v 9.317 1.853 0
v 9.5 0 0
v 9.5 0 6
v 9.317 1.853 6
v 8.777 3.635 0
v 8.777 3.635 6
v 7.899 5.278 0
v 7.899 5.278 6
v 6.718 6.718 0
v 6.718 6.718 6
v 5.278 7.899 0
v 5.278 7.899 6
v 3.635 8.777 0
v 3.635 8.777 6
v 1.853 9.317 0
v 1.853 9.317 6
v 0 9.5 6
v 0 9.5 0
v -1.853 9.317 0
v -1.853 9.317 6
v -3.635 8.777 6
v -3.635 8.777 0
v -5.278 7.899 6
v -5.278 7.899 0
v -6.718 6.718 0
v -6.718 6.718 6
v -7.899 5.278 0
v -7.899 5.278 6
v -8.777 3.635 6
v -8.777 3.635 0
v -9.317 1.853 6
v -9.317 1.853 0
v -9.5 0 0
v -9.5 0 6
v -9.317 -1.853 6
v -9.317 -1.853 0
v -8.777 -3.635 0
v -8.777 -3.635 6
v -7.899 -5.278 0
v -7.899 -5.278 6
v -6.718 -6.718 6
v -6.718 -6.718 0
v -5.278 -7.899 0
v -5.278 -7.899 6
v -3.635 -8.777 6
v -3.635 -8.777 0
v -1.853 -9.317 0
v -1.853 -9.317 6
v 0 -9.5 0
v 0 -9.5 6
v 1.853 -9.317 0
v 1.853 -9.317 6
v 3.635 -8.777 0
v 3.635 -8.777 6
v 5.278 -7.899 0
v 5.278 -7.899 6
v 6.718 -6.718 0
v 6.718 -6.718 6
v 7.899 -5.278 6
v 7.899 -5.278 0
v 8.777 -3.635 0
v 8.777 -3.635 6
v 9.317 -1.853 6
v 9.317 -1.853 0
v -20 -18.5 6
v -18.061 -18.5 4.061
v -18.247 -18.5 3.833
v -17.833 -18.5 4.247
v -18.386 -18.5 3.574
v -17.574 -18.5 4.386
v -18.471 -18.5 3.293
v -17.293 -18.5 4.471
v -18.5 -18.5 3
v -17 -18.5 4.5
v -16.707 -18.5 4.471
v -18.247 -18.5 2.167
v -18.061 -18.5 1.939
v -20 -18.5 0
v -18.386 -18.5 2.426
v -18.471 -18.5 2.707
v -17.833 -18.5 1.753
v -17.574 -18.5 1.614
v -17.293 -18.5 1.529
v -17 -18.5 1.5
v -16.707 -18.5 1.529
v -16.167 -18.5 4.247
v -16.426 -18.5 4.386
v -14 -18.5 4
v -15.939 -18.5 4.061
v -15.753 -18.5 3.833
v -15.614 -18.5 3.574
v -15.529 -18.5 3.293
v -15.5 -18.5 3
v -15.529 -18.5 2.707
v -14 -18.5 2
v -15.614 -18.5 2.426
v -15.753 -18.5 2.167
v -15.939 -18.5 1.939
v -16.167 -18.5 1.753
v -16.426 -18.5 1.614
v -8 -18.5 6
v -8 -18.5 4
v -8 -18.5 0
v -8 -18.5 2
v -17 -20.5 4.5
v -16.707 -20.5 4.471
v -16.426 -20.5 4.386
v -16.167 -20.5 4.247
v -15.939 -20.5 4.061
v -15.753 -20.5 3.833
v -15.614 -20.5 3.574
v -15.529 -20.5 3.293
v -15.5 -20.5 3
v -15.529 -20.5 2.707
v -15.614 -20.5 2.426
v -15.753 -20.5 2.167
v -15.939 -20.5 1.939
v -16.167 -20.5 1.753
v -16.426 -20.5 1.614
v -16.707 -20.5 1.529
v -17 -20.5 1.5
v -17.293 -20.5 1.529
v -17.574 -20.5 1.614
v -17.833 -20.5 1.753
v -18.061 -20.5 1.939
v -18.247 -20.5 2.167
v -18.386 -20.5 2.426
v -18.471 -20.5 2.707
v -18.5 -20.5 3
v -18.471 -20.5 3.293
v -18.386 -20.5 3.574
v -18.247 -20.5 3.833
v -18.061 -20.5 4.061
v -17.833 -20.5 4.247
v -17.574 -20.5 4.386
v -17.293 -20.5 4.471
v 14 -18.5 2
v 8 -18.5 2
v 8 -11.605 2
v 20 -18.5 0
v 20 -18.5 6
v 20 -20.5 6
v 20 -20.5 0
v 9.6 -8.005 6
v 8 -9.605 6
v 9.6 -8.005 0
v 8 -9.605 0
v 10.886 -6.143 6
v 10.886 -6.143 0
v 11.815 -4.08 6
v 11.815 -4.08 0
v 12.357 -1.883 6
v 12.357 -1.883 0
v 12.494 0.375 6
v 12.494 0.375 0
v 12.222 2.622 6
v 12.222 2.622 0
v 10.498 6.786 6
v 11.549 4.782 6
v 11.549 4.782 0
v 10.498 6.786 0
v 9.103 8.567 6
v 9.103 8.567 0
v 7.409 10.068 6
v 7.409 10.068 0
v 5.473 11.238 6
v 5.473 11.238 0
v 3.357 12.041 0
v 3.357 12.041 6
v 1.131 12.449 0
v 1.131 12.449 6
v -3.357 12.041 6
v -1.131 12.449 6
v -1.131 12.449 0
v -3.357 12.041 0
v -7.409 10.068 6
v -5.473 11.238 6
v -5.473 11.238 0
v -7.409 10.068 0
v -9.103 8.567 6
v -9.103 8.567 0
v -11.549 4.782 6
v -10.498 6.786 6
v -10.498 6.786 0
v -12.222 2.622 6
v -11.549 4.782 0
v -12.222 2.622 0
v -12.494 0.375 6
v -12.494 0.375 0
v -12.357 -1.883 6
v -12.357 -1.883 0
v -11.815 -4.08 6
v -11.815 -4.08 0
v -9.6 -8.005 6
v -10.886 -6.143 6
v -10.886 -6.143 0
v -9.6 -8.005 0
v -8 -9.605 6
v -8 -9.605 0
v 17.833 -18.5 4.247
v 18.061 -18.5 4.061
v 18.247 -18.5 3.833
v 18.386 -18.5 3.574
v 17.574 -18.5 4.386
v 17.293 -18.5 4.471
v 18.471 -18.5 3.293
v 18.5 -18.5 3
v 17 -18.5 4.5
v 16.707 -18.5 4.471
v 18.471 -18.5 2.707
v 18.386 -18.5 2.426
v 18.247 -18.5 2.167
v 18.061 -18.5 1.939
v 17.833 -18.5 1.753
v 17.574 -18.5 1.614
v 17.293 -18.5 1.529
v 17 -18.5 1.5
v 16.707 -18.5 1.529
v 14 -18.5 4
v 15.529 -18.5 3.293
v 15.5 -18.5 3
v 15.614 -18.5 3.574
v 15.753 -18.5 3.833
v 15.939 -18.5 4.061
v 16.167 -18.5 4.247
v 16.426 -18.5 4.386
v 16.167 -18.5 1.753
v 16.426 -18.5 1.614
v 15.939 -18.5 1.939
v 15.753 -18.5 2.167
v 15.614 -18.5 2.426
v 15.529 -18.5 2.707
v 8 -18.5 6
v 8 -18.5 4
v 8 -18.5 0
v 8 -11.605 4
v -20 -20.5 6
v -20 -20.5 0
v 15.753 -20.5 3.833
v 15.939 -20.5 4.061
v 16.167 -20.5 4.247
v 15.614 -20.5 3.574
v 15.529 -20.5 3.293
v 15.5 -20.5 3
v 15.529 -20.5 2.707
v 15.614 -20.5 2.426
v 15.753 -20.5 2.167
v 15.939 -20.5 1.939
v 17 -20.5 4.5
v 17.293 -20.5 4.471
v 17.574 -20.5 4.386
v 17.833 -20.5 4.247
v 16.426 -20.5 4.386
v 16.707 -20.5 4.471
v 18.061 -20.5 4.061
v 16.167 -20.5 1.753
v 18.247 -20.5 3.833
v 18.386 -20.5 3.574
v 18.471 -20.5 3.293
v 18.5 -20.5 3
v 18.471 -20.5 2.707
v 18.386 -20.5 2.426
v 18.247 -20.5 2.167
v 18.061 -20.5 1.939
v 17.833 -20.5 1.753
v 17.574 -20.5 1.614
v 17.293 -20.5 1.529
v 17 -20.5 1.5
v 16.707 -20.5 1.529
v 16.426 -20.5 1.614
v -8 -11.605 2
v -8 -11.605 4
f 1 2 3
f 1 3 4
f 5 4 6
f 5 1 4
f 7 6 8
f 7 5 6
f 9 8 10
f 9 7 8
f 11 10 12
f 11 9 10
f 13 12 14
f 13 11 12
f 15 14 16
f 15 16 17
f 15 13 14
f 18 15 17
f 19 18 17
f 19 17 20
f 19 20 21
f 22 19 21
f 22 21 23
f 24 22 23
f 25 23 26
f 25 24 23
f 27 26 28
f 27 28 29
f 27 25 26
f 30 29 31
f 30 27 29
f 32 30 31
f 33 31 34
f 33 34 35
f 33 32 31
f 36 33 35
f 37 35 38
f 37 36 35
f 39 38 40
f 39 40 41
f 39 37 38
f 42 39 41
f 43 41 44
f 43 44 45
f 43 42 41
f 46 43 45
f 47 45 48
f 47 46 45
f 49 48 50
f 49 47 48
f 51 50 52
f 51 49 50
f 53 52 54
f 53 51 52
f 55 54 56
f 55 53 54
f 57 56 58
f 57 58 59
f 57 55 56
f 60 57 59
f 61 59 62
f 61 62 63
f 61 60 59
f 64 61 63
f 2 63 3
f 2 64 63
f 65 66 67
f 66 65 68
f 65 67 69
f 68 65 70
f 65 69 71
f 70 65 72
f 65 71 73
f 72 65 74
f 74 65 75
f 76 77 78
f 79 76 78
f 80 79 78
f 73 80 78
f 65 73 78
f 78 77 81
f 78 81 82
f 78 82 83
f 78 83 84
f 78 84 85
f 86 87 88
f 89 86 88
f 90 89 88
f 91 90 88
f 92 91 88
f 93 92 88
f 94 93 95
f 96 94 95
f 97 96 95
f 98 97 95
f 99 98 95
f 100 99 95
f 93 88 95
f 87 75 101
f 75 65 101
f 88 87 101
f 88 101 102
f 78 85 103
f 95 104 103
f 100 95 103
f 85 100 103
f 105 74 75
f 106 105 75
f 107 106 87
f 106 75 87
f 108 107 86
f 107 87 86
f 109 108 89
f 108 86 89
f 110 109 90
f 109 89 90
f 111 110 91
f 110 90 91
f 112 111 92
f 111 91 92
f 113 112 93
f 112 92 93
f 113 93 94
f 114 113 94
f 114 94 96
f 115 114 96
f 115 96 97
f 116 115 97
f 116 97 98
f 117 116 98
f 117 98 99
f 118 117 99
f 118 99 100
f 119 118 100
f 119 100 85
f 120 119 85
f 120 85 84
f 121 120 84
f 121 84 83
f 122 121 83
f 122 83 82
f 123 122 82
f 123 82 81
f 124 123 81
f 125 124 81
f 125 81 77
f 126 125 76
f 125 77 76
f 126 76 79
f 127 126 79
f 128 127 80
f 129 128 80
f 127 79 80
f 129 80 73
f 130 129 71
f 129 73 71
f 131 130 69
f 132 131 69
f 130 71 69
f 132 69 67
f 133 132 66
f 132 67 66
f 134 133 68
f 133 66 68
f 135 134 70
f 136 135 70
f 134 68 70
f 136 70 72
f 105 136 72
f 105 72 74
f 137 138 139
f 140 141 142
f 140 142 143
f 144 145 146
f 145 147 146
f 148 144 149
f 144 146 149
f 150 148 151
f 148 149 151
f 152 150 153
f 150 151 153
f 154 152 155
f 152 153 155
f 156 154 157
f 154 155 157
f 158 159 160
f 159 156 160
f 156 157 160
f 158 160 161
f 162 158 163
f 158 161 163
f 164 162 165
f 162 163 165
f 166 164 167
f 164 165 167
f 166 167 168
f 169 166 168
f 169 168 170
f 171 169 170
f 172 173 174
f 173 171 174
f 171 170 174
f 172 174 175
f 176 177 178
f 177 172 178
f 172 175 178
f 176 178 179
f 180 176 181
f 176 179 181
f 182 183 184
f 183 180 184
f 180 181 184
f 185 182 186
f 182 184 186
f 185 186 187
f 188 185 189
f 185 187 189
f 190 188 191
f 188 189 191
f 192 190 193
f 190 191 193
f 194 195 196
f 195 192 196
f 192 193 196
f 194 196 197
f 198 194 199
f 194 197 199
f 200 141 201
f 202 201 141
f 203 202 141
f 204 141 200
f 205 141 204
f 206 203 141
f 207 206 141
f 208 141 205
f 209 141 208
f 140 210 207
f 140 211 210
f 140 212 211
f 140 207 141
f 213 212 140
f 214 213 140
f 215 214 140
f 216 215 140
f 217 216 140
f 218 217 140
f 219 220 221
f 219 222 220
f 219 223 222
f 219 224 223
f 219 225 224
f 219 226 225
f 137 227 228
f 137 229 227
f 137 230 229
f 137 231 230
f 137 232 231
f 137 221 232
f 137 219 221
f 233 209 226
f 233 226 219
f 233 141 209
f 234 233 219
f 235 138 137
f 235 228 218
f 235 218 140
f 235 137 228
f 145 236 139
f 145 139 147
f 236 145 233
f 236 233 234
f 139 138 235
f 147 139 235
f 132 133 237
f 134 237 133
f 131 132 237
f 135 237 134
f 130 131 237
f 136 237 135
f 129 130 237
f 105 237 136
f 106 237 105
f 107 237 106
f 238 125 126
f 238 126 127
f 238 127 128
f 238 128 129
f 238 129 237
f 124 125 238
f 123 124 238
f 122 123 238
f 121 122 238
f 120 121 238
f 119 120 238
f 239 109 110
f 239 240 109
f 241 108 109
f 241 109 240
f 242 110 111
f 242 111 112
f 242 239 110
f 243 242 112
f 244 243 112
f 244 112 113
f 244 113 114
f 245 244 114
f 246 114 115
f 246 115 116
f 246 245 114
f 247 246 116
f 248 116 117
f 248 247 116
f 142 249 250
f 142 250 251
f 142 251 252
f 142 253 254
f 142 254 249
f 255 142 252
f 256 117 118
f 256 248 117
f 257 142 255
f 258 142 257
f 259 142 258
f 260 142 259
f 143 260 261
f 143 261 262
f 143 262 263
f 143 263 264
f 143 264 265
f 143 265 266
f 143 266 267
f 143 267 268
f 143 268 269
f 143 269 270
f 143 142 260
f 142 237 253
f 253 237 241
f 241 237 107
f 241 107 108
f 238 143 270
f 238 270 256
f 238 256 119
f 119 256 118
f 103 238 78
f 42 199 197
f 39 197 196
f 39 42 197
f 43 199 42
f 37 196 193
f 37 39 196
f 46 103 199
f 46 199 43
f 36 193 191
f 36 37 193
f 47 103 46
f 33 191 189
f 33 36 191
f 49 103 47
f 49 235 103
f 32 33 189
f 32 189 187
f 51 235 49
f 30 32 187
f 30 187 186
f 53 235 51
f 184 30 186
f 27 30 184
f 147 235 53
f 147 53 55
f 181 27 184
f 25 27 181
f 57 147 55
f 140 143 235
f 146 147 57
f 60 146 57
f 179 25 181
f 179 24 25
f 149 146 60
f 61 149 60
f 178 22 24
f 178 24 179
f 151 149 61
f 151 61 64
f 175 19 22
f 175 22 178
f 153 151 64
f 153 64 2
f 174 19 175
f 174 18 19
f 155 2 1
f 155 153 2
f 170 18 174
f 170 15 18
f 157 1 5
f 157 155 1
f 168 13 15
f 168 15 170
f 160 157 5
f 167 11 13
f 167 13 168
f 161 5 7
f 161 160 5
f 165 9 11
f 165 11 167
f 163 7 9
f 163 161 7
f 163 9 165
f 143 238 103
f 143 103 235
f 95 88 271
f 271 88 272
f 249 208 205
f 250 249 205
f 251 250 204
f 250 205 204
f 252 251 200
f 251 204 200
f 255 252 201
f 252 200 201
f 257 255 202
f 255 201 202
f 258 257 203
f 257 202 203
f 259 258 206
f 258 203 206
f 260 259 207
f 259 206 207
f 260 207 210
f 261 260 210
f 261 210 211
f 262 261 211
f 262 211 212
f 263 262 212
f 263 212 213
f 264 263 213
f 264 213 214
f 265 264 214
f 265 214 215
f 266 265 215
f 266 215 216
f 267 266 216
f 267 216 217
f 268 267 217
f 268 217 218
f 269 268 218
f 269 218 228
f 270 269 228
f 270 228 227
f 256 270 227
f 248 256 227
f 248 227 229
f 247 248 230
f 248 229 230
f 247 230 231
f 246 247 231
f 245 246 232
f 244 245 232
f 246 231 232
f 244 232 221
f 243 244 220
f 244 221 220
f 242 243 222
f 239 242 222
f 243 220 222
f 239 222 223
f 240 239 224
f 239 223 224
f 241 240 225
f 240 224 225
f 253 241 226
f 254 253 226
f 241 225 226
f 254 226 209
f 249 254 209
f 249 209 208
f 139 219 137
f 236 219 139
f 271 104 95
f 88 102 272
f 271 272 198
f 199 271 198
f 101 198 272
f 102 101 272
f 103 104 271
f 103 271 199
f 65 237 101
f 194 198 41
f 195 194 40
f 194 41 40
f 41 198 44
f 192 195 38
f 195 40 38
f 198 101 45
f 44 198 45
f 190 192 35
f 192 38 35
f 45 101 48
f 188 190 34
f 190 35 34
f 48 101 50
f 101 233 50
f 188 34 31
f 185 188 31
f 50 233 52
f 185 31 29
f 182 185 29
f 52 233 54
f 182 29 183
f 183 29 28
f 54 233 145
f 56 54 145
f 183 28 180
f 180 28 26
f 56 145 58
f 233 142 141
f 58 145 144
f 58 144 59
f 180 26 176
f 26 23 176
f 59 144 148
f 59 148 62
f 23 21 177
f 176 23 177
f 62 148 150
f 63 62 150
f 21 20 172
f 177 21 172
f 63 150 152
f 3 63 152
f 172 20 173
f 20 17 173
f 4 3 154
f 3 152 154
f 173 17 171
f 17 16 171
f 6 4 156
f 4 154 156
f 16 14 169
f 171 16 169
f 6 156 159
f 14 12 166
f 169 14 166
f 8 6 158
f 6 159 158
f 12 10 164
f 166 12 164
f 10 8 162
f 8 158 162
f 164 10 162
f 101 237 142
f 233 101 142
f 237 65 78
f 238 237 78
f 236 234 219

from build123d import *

# Parameters (mm, degrees)
SKETCH1_R                            = 12.5
SKETCH1_R_2                          = 9.5
BOSS_EXTRUDE1_DEPTH                  = 6
SKETCH2_W                            = 16
SKETCH2_H                            = 6
BOSS_EXTRUDE2_DEPTH                  = 8
BOSS_EXTRUDE2_DIRECTION_2_REACH      = 30.588
BOSS_EXTRUDE2_DIRECTION_2_END_RADIUS = 12.5
SKETCH3_W                            = 6
SKETCH3_H                            = 2
BOSS_EXTRUDE3_DEPTH                  = 12
BOSS_EXTRUDE4_DEPTH                  = 1
CUT_EXTRUDE1_REACH                   = 39.376
SKETCH7_R                            = 1.5


with BuildPart() as part:
    # Sketch1 → Boss-Extrude1 (new body)
    with BuildSketch(Plane.XY):
        Circle(SKETCH1_R)
        Circle(SKETCH1_R_2, mode=Mode.SUBTRACT)
    extrude(amount=BOSS_EXTRUDE1_DEPTH)

    # Sketch2 → Boss-Extrude2 (add)
    with BuildSketch(Plane(origin=(0, -12.5, 0), x_dir=(-1, 0, 0), z_dir=(0, -1, 0))):
        with Locations((0, -3)):
            Rectangle(SKETCH2_W, SKETCH2_H)
    extrude(amount=BOSS_EXTRUDE2_DEPTH)

    # Boss-Extrude2 direction 2: up to this cylinder (the profile starts outside it)
    boss_extrude2_direction_2_end = Plane(origin=(0, 0, 3), z_dir=(0, 0, -1)) * Cylinder(BOSS_EXTRUDE2_DIRECTION_2_END_RADIUS, 87.176, mode=Mode.PRIVATE)
    # Sketch2 → Boss-Extrude2 direction 2 (add, up to the surface)
    with BuildSketch(Plane(origin=(0, -12.5, 0), x_dir=(-1, 0, 0), z_dir=(0, -1, 0)), mode=Mode.PRIVATE) as boss_extrude2_direction_2_sk1:
        with Locations((0, -3)):
            Rectangle(SKETCH2_W, SKETCH2_H)
    boss_extrude2_direction_2_tool1 = extrude(boss_extrude2_direction_2_sk1.sketch, amount=-BOSS_EXTRUDE2_DIRECTION_2_REACH, mode=Mode.PRIVATE) - boss_extrude2_direction_2_end
    add(boss_extrude2_direction_2_tool1.solids().sort_by_distance((0, -12.5, 3))[0])
    add(boss_extrude2_direction_2_tool1.solids().sort_by_distance((0, -12.5, 3))[1])

    # Sketch3 → Boss-Extrude3 (add)
    with BuildSketch(Plane(origin=(8, 0, 0), x_dir=(0, 0, -1), z_dir=(1, 0, 0))):
        with Locations((-3, -19.5)):
            Rectangle(SKETCH3_W, SKETCH3_H)
    boss_extrude3 = extrude(amount=BOSS_EXTRUDE3_DEPTH)

    # Mirror1: Boss-Extrude3 across plane
    add(boss_extrude3.mirror(Plane(origin=(0, 0, 0), x_dir=(0, 0, 1), z_dir=(1, 0, 0))))

    # Sketch6 → Boss-Extrude4 (add, symmetric)
    with BuildSketch(Plane.XY.offset(3)):
        Polygon((14, -18.5), (8, -11.604686356), (8, -18.5), align=None)
    boss_extrude4 = extrude(amount=BOSS_EXTRUDE4_DEPTH, both=True)

    # Mirror2: Boss-Extrude4 across plane
    add(boss_extrude4.mirror(Plane(origin=(0, 0, 0), x_dir=(0, 0, 1), z_dir=(1, 0, 0))))

    # Sketch7 → Cut-Extrude1 (cut, up to next)
    with BuildSketch(Plane(origin=(0, -18.5, 0), x_dir=(1, 0, 0), z_dir=(0, 1, 0)), mode=Mode.PRIVATE) as cut_extrude1_sk1:
        with Locations(Location((-17, -3, 0), (0, 0, 270))):
            Circle(SKETCH7_R)
    cut_extrude1_tool1 = extrude(cut_extrude1_sk1.sketch, amount=-CUT_EXTRUDE1_REACH, mode=Mode.PRIVATE) & part.part
    # Sketch7 → Cut-Extrude1 (cut, up to next)
    with BuildSketch(Plane(origin=(0, -18.5, 0), x_dir=(1, 0, 0), z_dir=(0, 1, 0)), mode=Mode.PRIVATE) as cut_extrude1_sk2:
        with Locations(Location((17, -3, 0), (0, 0, 270))):
            Circle(SKETCH7_R)
    cut_extrude1_tool2 = extrude(cut_extrude1_sk2.sketch, amount=-CUT_EXTRUDE1_REACH, mode=Mode.PRIVATE) & part.part
    add(cut_extrude1_tool1.solids().sort_by_distance((-17, -18.5, 3))[0], mode=Mode.SUBTRACT)
    add(cut_extrude1_tool2.solids().sort_by_distance((17, -18.5, 3))[0], mode=Mode.SUBTRACT)


solid = part.part
